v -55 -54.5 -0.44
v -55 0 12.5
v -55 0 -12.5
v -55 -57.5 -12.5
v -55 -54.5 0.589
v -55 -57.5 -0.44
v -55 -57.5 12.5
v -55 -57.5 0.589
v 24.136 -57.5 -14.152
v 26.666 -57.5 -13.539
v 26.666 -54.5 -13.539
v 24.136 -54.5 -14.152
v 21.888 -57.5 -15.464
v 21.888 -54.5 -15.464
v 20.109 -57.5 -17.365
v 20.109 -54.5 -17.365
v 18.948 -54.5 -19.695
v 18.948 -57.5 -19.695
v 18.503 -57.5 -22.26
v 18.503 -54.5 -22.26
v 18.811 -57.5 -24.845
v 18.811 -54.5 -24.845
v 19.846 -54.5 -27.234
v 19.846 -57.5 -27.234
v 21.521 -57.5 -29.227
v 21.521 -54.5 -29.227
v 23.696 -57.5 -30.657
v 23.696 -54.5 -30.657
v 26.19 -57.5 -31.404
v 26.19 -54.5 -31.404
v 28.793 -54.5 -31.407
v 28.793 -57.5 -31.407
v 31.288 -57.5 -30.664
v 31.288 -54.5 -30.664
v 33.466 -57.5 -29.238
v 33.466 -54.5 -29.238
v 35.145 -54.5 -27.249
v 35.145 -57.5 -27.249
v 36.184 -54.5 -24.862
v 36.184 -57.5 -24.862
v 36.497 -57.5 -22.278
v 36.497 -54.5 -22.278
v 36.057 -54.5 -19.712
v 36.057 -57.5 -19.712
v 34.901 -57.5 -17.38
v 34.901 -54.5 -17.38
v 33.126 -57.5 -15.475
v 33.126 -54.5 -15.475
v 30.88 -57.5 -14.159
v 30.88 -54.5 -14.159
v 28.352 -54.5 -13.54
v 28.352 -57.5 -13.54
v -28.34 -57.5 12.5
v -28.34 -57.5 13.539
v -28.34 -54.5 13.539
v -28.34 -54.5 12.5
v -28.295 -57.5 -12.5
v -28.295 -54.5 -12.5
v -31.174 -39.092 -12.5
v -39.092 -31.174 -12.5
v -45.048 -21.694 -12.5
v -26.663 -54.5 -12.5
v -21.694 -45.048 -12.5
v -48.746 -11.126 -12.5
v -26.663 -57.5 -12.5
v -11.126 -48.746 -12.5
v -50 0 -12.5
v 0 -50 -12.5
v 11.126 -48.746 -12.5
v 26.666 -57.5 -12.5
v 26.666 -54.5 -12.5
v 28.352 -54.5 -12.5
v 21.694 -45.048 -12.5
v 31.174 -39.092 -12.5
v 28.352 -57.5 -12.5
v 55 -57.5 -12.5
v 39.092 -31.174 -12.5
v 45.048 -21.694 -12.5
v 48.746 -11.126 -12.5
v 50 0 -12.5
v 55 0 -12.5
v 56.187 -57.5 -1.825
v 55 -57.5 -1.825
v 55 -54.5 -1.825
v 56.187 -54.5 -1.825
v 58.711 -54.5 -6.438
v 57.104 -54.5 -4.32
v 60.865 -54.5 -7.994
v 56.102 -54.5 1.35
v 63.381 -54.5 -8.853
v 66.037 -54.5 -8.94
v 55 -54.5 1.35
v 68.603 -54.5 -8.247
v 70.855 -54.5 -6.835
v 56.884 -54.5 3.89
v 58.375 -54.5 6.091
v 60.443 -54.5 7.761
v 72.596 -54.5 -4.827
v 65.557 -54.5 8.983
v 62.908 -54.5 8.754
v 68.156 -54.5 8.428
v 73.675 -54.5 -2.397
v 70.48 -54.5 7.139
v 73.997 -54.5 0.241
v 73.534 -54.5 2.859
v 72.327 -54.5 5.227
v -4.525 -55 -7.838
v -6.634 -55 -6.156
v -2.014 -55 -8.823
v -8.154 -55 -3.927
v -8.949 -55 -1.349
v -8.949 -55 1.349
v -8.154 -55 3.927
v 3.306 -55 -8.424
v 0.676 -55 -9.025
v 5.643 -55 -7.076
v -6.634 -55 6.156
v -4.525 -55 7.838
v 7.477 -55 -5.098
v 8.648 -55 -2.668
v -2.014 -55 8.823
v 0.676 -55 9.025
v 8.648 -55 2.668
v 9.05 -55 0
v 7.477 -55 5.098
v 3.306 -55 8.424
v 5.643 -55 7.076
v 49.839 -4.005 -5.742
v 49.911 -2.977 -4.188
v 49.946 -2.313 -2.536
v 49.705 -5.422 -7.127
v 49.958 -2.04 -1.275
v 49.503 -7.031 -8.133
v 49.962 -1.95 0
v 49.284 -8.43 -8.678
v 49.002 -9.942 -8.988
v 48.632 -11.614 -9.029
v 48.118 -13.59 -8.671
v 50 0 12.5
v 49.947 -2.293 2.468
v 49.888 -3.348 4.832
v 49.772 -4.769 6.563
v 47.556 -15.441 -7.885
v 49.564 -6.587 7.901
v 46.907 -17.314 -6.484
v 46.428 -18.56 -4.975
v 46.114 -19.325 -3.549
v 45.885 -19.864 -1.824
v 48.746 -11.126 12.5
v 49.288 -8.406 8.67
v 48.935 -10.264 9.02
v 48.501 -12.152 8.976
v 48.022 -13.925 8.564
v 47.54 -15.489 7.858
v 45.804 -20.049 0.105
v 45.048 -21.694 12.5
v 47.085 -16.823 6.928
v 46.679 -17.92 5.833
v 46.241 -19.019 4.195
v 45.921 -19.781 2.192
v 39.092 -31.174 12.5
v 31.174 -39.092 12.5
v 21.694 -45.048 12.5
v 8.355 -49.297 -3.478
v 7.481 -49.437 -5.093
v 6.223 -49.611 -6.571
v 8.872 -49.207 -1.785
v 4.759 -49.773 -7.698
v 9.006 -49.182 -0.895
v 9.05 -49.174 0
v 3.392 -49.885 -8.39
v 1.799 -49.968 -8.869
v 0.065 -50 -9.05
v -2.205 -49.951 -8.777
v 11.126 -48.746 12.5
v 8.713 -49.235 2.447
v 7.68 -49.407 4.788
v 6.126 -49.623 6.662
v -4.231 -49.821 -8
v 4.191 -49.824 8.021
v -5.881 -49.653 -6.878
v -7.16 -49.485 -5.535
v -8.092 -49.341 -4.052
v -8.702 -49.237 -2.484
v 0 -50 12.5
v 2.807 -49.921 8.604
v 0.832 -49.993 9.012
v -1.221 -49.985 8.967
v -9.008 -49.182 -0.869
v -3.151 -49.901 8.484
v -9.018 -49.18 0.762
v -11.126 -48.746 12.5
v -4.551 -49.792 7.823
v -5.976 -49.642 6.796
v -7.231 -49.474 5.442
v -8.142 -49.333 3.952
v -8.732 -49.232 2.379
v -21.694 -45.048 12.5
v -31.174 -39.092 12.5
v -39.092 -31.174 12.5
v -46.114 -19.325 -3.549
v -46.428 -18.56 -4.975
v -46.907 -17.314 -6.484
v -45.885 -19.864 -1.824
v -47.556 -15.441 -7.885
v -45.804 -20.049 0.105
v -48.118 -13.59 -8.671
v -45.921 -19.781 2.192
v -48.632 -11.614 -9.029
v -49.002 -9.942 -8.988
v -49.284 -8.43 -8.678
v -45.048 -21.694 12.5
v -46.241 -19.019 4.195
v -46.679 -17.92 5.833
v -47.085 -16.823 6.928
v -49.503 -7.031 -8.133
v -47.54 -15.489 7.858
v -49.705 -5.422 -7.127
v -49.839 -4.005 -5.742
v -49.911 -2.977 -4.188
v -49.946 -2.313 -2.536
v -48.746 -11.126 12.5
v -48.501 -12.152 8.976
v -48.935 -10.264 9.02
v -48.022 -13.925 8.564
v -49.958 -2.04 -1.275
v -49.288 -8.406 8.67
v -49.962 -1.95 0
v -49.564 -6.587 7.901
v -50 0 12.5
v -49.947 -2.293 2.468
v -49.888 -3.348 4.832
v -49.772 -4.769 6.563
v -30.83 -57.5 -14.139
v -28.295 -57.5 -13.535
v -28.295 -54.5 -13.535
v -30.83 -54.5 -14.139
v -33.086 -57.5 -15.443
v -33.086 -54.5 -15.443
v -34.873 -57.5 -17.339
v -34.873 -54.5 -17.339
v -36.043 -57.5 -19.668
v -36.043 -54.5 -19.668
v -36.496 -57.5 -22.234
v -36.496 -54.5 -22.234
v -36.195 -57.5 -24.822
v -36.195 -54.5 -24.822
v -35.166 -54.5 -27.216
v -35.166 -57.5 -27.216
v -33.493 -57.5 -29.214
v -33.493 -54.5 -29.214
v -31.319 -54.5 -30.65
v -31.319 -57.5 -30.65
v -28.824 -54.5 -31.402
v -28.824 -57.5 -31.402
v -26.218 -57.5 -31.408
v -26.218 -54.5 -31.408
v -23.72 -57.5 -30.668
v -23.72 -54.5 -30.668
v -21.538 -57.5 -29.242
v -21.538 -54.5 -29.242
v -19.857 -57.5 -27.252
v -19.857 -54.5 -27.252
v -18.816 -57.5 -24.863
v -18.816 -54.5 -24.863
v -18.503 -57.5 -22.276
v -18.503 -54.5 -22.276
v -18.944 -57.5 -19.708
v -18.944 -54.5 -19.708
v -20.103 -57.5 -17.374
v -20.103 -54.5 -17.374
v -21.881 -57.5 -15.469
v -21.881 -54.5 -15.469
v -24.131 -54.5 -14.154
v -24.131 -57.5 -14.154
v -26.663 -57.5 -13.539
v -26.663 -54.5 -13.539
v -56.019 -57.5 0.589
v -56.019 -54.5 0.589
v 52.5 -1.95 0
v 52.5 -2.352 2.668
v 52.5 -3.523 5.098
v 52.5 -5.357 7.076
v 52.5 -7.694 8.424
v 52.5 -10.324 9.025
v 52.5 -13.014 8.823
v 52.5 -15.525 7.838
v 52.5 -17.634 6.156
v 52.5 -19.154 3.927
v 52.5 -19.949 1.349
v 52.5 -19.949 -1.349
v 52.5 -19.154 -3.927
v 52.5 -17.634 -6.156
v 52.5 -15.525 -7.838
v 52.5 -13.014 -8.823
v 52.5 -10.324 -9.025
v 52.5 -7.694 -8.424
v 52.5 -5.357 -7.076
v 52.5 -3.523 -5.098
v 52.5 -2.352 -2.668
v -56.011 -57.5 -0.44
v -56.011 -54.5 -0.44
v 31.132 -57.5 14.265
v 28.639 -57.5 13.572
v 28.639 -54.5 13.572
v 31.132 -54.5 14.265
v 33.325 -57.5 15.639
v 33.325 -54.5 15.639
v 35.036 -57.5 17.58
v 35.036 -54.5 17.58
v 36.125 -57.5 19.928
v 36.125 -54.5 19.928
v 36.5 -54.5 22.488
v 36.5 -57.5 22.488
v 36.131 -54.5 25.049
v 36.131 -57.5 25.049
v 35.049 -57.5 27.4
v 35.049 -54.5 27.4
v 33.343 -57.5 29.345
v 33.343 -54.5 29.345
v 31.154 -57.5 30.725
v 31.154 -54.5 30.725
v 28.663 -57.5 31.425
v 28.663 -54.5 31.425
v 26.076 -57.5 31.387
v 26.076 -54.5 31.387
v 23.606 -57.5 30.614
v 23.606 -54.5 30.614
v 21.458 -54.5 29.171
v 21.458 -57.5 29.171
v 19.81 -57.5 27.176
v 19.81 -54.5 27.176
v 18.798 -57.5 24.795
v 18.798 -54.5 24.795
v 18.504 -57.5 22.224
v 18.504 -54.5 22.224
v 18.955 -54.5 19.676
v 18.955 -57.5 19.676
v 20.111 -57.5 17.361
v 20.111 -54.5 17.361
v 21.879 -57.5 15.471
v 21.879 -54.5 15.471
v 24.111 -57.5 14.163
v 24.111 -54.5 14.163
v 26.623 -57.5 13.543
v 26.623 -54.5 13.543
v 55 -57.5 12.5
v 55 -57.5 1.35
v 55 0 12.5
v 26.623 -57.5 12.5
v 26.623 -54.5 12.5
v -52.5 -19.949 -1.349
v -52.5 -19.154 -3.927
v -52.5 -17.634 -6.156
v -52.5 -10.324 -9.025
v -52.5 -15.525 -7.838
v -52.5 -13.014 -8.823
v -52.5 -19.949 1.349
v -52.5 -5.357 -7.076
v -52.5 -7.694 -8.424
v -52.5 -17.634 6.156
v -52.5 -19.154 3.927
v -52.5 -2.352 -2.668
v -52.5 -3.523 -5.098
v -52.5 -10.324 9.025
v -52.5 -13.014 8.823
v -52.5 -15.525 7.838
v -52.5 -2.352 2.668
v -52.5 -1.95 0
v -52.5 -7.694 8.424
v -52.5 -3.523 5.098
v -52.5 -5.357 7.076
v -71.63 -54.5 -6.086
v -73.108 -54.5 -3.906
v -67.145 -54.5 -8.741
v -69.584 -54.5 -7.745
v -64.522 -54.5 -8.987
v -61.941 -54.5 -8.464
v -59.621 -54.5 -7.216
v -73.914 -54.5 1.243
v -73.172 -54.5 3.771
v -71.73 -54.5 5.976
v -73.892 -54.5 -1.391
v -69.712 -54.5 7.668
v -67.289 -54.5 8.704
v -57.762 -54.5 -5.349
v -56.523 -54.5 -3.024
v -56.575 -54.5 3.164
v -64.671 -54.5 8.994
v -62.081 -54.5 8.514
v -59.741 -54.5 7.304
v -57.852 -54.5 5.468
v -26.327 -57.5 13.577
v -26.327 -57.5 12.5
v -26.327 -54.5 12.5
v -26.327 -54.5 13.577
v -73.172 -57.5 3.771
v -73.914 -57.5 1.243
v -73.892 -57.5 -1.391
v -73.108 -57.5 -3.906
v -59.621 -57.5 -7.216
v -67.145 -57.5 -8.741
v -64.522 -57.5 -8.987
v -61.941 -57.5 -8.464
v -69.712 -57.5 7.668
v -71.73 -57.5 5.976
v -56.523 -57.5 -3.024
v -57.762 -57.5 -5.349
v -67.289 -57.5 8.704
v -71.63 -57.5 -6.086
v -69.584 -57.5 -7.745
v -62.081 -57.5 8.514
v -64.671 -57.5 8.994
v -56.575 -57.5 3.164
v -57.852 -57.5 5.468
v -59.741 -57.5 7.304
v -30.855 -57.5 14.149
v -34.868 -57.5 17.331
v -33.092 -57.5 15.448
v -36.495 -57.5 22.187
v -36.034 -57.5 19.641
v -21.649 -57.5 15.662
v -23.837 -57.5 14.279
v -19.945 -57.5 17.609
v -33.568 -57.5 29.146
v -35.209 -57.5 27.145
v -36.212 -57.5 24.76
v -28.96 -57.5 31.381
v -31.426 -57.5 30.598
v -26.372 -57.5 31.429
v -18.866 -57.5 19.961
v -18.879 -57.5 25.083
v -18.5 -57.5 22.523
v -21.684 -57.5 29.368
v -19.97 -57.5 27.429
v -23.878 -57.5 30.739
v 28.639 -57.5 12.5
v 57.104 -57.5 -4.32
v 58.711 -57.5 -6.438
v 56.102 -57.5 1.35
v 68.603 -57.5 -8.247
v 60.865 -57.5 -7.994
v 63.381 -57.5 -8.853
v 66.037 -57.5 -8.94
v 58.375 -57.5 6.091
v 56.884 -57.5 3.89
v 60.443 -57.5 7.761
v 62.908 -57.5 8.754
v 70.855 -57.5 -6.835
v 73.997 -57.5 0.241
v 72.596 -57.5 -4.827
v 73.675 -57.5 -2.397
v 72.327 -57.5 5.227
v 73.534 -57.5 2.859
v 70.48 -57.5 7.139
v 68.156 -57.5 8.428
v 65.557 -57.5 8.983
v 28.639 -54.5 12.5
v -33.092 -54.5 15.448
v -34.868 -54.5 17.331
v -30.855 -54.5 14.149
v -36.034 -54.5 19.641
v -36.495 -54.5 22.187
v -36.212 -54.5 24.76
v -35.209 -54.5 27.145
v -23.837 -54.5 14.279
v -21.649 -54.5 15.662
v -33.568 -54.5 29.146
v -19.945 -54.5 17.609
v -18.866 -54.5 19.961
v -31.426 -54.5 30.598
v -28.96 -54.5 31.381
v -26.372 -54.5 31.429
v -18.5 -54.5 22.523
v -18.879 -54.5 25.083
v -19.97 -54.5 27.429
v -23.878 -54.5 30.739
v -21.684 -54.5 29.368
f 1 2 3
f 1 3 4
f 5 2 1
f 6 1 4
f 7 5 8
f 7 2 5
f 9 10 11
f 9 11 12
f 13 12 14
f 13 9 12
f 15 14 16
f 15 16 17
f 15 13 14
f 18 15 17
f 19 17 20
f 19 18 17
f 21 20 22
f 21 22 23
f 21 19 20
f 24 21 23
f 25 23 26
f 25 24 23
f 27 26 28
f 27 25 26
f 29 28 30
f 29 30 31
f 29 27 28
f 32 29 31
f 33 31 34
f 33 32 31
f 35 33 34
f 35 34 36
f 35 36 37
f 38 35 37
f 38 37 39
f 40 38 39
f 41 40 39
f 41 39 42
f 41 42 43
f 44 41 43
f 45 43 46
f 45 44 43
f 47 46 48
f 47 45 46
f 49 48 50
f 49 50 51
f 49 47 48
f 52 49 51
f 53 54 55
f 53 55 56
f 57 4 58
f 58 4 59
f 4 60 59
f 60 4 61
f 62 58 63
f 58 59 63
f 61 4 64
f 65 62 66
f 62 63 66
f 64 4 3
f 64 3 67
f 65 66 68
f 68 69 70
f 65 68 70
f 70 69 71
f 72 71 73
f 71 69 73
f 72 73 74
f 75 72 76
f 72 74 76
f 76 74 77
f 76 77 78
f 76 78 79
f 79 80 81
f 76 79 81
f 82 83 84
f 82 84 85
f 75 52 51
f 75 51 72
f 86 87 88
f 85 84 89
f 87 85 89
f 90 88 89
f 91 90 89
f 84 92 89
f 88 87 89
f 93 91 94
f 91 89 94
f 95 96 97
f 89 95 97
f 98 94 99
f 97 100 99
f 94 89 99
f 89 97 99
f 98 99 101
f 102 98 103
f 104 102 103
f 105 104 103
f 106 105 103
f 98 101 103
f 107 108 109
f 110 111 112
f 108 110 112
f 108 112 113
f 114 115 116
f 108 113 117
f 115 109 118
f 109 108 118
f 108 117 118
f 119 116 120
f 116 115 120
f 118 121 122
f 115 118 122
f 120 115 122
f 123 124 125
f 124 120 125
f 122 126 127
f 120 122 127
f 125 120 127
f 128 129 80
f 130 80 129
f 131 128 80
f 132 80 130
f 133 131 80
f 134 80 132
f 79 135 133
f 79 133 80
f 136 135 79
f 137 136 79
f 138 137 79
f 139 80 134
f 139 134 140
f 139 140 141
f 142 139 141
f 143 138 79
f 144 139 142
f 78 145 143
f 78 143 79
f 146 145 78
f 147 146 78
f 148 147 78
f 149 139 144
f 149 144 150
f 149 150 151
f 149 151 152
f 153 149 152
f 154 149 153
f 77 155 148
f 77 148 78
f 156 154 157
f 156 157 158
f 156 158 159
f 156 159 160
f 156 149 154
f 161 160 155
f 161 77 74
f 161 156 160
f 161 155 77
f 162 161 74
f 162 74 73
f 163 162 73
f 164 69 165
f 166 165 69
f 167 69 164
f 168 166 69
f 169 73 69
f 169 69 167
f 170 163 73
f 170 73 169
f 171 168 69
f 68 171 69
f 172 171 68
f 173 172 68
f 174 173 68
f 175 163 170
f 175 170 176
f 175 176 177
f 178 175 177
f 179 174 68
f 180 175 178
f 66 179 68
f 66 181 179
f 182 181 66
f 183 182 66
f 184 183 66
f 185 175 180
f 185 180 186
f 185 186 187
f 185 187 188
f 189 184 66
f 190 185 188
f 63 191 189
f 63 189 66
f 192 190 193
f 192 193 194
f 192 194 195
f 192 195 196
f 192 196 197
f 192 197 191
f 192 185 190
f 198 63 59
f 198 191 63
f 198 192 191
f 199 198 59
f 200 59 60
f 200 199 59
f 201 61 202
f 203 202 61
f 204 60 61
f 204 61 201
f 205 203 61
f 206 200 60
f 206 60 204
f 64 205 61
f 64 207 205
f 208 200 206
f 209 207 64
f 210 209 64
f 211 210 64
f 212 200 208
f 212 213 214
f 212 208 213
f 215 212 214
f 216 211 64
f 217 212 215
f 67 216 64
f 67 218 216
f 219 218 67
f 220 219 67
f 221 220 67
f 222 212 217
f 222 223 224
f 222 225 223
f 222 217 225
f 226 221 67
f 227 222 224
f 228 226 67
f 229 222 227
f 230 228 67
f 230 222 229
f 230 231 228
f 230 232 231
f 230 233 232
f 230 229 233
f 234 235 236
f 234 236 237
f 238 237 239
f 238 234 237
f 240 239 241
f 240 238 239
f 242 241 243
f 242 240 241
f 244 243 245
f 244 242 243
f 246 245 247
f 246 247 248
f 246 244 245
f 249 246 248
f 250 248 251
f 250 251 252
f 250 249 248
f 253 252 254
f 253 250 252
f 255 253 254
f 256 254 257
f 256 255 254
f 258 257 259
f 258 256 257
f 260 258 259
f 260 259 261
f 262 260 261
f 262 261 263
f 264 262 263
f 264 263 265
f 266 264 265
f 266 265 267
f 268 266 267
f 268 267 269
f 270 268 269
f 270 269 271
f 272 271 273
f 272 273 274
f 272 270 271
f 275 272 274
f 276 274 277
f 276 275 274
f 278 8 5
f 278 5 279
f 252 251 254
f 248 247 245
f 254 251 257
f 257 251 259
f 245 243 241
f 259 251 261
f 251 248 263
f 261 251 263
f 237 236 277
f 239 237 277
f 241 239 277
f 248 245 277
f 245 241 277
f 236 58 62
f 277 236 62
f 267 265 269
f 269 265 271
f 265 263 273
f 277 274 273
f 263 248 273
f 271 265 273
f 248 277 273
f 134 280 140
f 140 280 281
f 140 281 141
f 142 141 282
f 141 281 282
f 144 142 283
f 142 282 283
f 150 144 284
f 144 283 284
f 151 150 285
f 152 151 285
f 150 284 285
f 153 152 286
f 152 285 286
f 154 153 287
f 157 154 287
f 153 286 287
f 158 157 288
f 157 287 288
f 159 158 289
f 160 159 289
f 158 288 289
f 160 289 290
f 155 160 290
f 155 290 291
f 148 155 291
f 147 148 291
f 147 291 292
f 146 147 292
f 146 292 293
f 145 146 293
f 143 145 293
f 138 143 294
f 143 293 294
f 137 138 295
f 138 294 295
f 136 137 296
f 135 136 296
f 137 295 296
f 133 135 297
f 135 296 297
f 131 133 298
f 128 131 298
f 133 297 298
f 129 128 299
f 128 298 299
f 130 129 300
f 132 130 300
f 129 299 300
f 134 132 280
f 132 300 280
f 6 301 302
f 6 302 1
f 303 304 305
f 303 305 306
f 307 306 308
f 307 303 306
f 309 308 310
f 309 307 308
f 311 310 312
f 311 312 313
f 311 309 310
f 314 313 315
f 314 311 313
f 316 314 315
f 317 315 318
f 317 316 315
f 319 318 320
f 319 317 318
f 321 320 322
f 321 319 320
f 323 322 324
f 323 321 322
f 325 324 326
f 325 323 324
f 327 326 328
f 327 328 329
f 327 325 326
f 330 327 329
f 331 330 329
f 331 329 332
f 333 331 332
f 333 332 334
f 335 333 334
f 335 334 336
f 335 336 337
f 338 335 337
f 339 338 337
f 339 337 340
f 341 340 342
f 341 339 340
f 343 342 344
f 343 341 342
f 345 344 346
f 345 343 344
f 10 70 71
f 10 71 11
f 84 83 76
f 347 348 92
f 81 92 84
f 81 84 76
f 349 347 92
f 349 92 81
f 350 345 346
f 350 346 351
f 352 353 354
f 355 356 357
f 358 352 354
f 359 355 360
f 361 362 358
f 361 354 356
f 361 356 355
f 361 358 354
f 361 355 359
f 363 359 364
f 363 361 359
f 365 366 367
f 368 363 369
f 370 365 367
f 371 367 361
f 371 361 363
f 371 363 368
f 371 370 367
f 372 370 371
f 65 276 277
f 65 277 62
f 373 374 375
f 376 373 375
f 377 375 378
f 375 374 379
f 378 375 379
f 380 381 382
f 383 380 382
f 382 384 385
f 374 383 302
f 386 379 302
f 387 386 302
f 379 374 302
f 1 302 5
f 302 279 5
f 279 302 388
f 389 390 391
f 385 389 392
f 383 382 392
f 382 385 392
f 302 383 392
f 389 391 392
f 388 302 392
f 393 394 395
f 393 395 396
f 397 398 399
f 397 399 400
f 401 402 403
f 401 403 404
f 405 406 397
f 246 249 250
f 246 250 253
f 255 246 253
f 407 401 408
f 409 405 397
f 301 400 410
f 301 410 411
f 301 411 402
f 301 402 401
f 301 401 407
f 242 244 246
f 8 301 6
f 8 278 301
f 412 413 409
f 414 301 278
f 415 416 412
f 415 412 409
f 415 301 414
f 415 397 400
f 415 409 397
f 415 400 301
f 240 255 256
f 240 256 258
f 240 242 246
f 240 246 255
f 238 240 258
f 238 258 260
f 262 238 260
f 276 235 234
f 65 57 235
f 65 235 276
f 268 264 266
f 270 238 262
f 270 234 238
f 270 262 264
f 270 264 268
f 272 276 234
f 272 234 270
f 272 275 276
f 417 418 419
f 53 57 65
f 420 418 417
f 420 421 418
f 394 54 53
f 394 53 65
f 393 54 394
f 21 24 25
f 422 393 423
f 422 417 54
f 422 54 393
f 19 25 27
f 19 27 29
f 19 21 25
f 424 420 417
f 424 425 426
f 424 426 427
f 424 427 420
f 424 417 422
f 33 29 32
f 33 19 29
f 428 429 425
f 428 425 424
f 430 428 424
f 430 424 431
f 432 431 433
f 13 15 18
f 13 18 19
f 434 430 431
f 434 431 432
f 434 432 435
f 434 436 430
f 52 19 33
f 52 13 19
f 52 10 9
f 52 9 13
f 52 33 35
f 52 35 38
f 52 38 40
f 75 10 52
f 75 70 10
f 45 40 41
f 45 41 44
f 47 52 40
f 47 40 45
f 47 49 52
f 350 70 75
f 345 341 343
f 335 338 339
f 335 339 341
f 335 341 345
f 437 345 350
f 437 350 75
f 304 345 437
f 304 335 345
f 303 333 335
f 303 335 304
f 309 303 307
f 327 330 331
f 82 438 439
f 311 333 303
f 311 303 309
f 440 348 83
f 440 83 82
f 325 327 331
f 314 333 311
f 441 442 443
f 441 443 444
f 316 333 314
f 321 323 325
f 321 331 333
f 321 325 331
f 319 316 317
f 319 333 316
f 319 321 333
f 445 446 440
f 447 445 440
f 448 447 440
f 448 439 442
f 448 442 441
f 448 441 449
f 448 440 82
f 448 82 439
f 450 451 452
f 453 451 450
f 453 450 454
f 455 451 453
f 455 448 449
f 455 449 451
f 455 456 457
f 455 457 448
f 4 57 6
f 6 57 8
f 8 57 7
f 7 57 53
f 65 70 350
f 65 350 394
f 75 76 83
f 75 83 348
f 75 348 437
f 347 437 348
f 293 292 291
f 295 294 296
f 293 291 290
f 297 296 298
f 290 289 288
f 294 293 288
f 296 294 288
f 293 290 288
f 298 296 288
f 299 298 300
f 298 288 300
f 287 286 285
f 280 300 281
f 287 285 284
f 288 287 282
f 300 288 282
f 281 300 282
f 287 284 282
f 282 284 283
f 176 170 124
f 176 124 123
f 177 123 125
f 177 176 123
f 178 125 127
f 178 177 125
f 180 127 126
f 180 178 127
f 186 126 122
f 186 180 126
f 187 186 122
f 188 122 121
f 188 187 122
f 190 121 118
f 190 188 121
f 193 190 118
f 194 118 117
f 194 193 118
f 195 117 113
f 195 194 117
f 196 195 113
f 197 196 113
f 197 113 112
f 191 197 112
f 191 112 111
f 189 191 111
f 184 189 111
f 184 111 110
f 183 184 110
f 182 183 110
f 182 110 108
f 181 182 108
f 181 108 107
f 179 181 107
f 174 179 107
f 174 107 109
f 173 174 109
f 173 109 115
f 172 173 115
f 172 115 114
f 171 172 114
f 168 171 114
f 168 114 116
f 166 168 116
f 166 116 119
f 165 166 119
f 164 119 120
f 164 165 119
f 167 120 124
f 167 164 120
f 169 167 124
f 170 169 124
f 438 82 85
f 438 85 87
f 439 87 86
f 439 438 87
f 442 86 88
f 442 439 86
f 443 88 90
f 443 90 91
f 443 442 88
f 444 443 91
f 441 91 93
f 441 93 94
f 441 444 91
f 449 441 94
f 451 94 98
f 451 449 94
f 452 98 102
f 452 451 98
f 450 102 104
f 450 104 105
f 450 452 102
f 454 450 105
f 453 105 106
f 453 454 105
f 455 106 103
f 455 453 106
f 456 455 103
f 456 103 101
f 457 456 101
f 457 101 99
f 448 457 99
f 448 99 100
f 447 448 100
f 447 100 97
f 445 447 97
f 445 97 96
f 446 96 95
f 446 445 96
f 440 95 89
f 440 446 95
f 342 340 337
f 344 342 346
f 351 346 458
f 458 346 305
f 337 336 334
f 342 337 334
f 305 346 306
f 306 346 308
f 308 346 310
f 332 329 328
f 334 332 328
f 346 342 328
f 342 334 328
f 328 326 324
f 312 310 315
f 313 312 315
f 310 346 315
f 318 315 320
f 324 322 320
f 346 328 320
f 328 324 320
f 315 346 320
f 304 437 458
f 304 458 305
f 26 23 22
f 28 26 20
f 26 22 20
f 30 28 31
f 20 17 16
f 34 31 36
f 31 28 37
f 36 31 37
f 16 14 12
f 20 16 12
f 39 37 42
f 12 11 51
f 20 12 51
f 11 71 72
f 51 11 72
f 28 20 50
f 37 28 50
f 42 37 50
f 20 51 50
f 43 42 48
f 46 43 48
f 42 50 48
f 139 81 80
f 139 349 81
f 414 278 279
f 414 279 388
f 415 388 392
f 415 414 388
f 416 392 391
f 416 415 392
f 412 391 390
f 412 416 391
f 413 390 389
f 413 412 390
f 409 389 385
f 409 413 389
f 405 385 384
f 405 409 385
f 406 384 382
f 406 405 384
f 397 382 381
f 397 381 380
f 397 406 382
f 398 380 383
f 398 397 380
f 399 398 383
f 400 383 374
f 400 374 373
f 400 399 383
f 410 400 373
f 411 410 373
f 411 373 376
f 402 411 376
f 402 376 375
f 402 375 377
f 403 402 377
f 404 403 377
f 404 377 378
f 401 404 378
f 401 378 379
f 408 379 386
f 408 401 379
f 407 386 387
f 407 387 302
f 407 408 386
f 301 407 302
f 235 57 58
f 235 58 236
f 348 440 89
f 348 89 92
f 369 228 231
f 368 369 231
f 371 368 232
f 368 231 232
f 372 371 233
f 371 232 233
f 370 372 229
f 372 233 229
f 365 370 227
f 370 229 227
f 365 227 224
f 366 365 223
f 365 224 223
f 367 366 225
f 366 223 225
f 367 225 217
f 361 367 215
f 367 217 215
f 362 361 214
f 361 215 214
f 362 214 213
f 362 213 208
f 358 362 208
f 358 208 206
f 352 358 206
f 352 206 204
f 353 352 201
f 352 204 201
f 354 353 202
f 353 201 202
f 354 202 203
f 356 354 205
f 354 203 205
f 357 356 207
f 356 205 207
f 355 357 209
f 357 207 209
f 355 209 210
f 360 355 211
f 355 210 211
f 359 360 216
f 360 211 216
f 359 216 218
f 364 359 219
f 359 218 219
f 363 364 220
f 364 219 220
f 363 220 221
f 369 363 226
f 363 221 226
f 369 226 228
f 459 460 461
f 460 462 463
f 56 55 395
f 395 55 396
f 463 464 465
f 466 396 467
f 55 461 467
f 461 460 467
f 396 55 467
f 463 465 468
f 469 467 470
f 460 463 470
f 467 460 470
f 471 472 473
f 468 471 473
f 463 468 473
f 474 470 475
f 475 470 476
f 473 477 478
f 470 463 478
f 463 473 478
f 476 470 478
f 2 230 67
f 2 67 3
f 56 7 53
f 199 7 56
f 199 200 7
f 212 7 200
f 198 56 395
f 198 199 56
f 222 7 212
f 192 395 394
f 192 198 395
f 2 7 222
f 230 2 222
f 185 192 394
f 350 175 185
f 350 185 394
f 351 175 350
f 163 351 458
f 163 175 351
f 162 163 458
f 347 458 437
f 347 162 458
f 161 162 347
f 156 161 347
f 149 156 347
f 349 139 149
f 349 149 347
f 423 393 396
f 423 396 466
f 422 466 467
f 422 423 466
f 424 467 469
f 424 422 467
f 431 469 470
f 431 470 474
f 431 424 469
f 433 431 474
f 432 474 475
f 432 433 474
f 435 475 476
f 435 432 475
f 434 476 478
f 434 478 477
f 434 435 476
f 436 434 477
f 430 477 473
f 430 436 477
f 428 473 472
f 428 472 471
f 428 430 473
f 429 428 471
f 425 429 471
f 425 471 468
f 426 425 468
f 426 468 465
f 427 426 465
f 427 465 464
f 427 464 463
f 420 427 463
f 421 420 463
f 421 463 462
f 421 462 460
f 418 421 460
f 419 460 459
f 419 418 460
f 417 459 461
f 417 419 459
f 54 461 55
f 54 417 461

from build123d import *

# Parameters (mm, degrees)
F1_DEPTH = 12.5
F3_DEPTH = 25
F4_R     = 9.05
F5_DEPTH = 55
F6_R     = 9.05
F7_DEPTH = 52.5
F9_DEPTH = 3


with BuildPart() as f1:
    # F0 (on Top) → F1 (new body, symmetric)
    with BuildSketch(Plane.XY):
        with BuildLine():
            ThreePointArc((50, 0), (0, -50), (-50, 0))
            Line((-50, 0), (-55, 0))
            ThreePointArc((-55, 0), (0, -55), (55, 0))
            Line((55, 0), (50, 0))
        make_face()
    extrude(amount=F1_DEPTH, both=True)

    # F2 (on face) → F3 (join)
    with BuildSketch(Plane.XY.offset(12.5)):
        with BuildLine():
            ThreePointArc((55, 0), (0, -55), (-55, 0))
            Line((-55, 0), (-55, -57.5))
            Line((-55, -57.5), (0, -57.5))
            Line((0, -57.5), (55, -57.5))
            Line((55, -57.5), (55, 0))
        make_face()
    extrude(amount=-F3_DEPTH)

    # F4 (on Front) → F5 (cut)
    with BuildSketch(Plane.XZ):
        Circle(F4_R)
    extrude(amount=F5_DEPTH, mode=Mode.SUBTRACT)

    # F6 (on Right) → F7 (cut, symmetric)
    with BuildSketch(Plane.YZ):
        with Locations((-11, 0)):
            Circle(F6_R)
    extrude(amount=F7_DEPTH, both=True, mode=Mode.SUBTRACT)

    # F8 (on face) → F9 (join)
    with BuildSketch(Plane.XZ.offset(57.5)):
        with BuildLine():
            Line((55, -1.825145), (56.187007, -1.825145))
            ThreePointArc((56.187007, -1.825145), (73.996764, 0.241309), (56.101841, 1.350101))
            Line((56.101841, 1.350101), (55, 1.350101))
            Line((55, 1.350101), (55, -1.825145))
        make_face()
        with BuildLine():
            Line((-55, 0.589209), (-56.019308, 0.589209))
            ThreePointArc((-56.019308, 0.589209), (-73.999691, -0.074534), (-56.010781, -0.440385))
            Line((-56.010781, -0.440385), (-55, -0.440385))
            Line((-55, -0.440385), (-55, 0.589209))
        make_face()
        with BuildLine():
            Line((26.665892, -12.5), (26.665892, -13.538735))
            ThreePointArc((26.665892, -13.538735), (27.491135, -31.499996), (28.35176, -13.540396))
            Line((28.35176, -13.540396), (28.35176, -12.5))
            Line((28.35176, -12.5), (26.665892, -12.5))
        make_face()
        with BuildLine():
            Line((-28.294771, -12.5), (-28.294771, -13.535161))
            ThreePointArc((-28.294771, -13.535161), (-27.521055, -31.499975), (-26.663293, -13.538978))
            Line((-26.663293, -13.538978), (-26.663293, -12.5))
            Line((-26.663293, -12.5), (-28.294771, -12.5))
        make_face()
        with BuildLine():
            Line((-26.327094, 12.5), (-26.327094, 13.576756))
            ThreePointArc((-26.327094, 13.576756), (-27.667739, 31.498437), (-28.339533, 13.539242))
            Line((-28.339533, 13.539242), (-28.339533, 12.5))
            Line((-28.339533, 12.5), (-26.327094, 12.5))
        make_face()
        with BuildLine():
            Line((28.639116, 12.5), (28.639116, 13.572379))
            ThreePointArc((28.639116, 13.572379), (27.368028, 31.499032), (26.623167, 13.542815))
            Line((26.623167, 13.542815), (26.623167, 12.5))
            Line((26.623167, 12.5), (28.639116, 12.5))
        make_face()
    extrude(amount=-F9_DEPTH)


solid = f1.part
